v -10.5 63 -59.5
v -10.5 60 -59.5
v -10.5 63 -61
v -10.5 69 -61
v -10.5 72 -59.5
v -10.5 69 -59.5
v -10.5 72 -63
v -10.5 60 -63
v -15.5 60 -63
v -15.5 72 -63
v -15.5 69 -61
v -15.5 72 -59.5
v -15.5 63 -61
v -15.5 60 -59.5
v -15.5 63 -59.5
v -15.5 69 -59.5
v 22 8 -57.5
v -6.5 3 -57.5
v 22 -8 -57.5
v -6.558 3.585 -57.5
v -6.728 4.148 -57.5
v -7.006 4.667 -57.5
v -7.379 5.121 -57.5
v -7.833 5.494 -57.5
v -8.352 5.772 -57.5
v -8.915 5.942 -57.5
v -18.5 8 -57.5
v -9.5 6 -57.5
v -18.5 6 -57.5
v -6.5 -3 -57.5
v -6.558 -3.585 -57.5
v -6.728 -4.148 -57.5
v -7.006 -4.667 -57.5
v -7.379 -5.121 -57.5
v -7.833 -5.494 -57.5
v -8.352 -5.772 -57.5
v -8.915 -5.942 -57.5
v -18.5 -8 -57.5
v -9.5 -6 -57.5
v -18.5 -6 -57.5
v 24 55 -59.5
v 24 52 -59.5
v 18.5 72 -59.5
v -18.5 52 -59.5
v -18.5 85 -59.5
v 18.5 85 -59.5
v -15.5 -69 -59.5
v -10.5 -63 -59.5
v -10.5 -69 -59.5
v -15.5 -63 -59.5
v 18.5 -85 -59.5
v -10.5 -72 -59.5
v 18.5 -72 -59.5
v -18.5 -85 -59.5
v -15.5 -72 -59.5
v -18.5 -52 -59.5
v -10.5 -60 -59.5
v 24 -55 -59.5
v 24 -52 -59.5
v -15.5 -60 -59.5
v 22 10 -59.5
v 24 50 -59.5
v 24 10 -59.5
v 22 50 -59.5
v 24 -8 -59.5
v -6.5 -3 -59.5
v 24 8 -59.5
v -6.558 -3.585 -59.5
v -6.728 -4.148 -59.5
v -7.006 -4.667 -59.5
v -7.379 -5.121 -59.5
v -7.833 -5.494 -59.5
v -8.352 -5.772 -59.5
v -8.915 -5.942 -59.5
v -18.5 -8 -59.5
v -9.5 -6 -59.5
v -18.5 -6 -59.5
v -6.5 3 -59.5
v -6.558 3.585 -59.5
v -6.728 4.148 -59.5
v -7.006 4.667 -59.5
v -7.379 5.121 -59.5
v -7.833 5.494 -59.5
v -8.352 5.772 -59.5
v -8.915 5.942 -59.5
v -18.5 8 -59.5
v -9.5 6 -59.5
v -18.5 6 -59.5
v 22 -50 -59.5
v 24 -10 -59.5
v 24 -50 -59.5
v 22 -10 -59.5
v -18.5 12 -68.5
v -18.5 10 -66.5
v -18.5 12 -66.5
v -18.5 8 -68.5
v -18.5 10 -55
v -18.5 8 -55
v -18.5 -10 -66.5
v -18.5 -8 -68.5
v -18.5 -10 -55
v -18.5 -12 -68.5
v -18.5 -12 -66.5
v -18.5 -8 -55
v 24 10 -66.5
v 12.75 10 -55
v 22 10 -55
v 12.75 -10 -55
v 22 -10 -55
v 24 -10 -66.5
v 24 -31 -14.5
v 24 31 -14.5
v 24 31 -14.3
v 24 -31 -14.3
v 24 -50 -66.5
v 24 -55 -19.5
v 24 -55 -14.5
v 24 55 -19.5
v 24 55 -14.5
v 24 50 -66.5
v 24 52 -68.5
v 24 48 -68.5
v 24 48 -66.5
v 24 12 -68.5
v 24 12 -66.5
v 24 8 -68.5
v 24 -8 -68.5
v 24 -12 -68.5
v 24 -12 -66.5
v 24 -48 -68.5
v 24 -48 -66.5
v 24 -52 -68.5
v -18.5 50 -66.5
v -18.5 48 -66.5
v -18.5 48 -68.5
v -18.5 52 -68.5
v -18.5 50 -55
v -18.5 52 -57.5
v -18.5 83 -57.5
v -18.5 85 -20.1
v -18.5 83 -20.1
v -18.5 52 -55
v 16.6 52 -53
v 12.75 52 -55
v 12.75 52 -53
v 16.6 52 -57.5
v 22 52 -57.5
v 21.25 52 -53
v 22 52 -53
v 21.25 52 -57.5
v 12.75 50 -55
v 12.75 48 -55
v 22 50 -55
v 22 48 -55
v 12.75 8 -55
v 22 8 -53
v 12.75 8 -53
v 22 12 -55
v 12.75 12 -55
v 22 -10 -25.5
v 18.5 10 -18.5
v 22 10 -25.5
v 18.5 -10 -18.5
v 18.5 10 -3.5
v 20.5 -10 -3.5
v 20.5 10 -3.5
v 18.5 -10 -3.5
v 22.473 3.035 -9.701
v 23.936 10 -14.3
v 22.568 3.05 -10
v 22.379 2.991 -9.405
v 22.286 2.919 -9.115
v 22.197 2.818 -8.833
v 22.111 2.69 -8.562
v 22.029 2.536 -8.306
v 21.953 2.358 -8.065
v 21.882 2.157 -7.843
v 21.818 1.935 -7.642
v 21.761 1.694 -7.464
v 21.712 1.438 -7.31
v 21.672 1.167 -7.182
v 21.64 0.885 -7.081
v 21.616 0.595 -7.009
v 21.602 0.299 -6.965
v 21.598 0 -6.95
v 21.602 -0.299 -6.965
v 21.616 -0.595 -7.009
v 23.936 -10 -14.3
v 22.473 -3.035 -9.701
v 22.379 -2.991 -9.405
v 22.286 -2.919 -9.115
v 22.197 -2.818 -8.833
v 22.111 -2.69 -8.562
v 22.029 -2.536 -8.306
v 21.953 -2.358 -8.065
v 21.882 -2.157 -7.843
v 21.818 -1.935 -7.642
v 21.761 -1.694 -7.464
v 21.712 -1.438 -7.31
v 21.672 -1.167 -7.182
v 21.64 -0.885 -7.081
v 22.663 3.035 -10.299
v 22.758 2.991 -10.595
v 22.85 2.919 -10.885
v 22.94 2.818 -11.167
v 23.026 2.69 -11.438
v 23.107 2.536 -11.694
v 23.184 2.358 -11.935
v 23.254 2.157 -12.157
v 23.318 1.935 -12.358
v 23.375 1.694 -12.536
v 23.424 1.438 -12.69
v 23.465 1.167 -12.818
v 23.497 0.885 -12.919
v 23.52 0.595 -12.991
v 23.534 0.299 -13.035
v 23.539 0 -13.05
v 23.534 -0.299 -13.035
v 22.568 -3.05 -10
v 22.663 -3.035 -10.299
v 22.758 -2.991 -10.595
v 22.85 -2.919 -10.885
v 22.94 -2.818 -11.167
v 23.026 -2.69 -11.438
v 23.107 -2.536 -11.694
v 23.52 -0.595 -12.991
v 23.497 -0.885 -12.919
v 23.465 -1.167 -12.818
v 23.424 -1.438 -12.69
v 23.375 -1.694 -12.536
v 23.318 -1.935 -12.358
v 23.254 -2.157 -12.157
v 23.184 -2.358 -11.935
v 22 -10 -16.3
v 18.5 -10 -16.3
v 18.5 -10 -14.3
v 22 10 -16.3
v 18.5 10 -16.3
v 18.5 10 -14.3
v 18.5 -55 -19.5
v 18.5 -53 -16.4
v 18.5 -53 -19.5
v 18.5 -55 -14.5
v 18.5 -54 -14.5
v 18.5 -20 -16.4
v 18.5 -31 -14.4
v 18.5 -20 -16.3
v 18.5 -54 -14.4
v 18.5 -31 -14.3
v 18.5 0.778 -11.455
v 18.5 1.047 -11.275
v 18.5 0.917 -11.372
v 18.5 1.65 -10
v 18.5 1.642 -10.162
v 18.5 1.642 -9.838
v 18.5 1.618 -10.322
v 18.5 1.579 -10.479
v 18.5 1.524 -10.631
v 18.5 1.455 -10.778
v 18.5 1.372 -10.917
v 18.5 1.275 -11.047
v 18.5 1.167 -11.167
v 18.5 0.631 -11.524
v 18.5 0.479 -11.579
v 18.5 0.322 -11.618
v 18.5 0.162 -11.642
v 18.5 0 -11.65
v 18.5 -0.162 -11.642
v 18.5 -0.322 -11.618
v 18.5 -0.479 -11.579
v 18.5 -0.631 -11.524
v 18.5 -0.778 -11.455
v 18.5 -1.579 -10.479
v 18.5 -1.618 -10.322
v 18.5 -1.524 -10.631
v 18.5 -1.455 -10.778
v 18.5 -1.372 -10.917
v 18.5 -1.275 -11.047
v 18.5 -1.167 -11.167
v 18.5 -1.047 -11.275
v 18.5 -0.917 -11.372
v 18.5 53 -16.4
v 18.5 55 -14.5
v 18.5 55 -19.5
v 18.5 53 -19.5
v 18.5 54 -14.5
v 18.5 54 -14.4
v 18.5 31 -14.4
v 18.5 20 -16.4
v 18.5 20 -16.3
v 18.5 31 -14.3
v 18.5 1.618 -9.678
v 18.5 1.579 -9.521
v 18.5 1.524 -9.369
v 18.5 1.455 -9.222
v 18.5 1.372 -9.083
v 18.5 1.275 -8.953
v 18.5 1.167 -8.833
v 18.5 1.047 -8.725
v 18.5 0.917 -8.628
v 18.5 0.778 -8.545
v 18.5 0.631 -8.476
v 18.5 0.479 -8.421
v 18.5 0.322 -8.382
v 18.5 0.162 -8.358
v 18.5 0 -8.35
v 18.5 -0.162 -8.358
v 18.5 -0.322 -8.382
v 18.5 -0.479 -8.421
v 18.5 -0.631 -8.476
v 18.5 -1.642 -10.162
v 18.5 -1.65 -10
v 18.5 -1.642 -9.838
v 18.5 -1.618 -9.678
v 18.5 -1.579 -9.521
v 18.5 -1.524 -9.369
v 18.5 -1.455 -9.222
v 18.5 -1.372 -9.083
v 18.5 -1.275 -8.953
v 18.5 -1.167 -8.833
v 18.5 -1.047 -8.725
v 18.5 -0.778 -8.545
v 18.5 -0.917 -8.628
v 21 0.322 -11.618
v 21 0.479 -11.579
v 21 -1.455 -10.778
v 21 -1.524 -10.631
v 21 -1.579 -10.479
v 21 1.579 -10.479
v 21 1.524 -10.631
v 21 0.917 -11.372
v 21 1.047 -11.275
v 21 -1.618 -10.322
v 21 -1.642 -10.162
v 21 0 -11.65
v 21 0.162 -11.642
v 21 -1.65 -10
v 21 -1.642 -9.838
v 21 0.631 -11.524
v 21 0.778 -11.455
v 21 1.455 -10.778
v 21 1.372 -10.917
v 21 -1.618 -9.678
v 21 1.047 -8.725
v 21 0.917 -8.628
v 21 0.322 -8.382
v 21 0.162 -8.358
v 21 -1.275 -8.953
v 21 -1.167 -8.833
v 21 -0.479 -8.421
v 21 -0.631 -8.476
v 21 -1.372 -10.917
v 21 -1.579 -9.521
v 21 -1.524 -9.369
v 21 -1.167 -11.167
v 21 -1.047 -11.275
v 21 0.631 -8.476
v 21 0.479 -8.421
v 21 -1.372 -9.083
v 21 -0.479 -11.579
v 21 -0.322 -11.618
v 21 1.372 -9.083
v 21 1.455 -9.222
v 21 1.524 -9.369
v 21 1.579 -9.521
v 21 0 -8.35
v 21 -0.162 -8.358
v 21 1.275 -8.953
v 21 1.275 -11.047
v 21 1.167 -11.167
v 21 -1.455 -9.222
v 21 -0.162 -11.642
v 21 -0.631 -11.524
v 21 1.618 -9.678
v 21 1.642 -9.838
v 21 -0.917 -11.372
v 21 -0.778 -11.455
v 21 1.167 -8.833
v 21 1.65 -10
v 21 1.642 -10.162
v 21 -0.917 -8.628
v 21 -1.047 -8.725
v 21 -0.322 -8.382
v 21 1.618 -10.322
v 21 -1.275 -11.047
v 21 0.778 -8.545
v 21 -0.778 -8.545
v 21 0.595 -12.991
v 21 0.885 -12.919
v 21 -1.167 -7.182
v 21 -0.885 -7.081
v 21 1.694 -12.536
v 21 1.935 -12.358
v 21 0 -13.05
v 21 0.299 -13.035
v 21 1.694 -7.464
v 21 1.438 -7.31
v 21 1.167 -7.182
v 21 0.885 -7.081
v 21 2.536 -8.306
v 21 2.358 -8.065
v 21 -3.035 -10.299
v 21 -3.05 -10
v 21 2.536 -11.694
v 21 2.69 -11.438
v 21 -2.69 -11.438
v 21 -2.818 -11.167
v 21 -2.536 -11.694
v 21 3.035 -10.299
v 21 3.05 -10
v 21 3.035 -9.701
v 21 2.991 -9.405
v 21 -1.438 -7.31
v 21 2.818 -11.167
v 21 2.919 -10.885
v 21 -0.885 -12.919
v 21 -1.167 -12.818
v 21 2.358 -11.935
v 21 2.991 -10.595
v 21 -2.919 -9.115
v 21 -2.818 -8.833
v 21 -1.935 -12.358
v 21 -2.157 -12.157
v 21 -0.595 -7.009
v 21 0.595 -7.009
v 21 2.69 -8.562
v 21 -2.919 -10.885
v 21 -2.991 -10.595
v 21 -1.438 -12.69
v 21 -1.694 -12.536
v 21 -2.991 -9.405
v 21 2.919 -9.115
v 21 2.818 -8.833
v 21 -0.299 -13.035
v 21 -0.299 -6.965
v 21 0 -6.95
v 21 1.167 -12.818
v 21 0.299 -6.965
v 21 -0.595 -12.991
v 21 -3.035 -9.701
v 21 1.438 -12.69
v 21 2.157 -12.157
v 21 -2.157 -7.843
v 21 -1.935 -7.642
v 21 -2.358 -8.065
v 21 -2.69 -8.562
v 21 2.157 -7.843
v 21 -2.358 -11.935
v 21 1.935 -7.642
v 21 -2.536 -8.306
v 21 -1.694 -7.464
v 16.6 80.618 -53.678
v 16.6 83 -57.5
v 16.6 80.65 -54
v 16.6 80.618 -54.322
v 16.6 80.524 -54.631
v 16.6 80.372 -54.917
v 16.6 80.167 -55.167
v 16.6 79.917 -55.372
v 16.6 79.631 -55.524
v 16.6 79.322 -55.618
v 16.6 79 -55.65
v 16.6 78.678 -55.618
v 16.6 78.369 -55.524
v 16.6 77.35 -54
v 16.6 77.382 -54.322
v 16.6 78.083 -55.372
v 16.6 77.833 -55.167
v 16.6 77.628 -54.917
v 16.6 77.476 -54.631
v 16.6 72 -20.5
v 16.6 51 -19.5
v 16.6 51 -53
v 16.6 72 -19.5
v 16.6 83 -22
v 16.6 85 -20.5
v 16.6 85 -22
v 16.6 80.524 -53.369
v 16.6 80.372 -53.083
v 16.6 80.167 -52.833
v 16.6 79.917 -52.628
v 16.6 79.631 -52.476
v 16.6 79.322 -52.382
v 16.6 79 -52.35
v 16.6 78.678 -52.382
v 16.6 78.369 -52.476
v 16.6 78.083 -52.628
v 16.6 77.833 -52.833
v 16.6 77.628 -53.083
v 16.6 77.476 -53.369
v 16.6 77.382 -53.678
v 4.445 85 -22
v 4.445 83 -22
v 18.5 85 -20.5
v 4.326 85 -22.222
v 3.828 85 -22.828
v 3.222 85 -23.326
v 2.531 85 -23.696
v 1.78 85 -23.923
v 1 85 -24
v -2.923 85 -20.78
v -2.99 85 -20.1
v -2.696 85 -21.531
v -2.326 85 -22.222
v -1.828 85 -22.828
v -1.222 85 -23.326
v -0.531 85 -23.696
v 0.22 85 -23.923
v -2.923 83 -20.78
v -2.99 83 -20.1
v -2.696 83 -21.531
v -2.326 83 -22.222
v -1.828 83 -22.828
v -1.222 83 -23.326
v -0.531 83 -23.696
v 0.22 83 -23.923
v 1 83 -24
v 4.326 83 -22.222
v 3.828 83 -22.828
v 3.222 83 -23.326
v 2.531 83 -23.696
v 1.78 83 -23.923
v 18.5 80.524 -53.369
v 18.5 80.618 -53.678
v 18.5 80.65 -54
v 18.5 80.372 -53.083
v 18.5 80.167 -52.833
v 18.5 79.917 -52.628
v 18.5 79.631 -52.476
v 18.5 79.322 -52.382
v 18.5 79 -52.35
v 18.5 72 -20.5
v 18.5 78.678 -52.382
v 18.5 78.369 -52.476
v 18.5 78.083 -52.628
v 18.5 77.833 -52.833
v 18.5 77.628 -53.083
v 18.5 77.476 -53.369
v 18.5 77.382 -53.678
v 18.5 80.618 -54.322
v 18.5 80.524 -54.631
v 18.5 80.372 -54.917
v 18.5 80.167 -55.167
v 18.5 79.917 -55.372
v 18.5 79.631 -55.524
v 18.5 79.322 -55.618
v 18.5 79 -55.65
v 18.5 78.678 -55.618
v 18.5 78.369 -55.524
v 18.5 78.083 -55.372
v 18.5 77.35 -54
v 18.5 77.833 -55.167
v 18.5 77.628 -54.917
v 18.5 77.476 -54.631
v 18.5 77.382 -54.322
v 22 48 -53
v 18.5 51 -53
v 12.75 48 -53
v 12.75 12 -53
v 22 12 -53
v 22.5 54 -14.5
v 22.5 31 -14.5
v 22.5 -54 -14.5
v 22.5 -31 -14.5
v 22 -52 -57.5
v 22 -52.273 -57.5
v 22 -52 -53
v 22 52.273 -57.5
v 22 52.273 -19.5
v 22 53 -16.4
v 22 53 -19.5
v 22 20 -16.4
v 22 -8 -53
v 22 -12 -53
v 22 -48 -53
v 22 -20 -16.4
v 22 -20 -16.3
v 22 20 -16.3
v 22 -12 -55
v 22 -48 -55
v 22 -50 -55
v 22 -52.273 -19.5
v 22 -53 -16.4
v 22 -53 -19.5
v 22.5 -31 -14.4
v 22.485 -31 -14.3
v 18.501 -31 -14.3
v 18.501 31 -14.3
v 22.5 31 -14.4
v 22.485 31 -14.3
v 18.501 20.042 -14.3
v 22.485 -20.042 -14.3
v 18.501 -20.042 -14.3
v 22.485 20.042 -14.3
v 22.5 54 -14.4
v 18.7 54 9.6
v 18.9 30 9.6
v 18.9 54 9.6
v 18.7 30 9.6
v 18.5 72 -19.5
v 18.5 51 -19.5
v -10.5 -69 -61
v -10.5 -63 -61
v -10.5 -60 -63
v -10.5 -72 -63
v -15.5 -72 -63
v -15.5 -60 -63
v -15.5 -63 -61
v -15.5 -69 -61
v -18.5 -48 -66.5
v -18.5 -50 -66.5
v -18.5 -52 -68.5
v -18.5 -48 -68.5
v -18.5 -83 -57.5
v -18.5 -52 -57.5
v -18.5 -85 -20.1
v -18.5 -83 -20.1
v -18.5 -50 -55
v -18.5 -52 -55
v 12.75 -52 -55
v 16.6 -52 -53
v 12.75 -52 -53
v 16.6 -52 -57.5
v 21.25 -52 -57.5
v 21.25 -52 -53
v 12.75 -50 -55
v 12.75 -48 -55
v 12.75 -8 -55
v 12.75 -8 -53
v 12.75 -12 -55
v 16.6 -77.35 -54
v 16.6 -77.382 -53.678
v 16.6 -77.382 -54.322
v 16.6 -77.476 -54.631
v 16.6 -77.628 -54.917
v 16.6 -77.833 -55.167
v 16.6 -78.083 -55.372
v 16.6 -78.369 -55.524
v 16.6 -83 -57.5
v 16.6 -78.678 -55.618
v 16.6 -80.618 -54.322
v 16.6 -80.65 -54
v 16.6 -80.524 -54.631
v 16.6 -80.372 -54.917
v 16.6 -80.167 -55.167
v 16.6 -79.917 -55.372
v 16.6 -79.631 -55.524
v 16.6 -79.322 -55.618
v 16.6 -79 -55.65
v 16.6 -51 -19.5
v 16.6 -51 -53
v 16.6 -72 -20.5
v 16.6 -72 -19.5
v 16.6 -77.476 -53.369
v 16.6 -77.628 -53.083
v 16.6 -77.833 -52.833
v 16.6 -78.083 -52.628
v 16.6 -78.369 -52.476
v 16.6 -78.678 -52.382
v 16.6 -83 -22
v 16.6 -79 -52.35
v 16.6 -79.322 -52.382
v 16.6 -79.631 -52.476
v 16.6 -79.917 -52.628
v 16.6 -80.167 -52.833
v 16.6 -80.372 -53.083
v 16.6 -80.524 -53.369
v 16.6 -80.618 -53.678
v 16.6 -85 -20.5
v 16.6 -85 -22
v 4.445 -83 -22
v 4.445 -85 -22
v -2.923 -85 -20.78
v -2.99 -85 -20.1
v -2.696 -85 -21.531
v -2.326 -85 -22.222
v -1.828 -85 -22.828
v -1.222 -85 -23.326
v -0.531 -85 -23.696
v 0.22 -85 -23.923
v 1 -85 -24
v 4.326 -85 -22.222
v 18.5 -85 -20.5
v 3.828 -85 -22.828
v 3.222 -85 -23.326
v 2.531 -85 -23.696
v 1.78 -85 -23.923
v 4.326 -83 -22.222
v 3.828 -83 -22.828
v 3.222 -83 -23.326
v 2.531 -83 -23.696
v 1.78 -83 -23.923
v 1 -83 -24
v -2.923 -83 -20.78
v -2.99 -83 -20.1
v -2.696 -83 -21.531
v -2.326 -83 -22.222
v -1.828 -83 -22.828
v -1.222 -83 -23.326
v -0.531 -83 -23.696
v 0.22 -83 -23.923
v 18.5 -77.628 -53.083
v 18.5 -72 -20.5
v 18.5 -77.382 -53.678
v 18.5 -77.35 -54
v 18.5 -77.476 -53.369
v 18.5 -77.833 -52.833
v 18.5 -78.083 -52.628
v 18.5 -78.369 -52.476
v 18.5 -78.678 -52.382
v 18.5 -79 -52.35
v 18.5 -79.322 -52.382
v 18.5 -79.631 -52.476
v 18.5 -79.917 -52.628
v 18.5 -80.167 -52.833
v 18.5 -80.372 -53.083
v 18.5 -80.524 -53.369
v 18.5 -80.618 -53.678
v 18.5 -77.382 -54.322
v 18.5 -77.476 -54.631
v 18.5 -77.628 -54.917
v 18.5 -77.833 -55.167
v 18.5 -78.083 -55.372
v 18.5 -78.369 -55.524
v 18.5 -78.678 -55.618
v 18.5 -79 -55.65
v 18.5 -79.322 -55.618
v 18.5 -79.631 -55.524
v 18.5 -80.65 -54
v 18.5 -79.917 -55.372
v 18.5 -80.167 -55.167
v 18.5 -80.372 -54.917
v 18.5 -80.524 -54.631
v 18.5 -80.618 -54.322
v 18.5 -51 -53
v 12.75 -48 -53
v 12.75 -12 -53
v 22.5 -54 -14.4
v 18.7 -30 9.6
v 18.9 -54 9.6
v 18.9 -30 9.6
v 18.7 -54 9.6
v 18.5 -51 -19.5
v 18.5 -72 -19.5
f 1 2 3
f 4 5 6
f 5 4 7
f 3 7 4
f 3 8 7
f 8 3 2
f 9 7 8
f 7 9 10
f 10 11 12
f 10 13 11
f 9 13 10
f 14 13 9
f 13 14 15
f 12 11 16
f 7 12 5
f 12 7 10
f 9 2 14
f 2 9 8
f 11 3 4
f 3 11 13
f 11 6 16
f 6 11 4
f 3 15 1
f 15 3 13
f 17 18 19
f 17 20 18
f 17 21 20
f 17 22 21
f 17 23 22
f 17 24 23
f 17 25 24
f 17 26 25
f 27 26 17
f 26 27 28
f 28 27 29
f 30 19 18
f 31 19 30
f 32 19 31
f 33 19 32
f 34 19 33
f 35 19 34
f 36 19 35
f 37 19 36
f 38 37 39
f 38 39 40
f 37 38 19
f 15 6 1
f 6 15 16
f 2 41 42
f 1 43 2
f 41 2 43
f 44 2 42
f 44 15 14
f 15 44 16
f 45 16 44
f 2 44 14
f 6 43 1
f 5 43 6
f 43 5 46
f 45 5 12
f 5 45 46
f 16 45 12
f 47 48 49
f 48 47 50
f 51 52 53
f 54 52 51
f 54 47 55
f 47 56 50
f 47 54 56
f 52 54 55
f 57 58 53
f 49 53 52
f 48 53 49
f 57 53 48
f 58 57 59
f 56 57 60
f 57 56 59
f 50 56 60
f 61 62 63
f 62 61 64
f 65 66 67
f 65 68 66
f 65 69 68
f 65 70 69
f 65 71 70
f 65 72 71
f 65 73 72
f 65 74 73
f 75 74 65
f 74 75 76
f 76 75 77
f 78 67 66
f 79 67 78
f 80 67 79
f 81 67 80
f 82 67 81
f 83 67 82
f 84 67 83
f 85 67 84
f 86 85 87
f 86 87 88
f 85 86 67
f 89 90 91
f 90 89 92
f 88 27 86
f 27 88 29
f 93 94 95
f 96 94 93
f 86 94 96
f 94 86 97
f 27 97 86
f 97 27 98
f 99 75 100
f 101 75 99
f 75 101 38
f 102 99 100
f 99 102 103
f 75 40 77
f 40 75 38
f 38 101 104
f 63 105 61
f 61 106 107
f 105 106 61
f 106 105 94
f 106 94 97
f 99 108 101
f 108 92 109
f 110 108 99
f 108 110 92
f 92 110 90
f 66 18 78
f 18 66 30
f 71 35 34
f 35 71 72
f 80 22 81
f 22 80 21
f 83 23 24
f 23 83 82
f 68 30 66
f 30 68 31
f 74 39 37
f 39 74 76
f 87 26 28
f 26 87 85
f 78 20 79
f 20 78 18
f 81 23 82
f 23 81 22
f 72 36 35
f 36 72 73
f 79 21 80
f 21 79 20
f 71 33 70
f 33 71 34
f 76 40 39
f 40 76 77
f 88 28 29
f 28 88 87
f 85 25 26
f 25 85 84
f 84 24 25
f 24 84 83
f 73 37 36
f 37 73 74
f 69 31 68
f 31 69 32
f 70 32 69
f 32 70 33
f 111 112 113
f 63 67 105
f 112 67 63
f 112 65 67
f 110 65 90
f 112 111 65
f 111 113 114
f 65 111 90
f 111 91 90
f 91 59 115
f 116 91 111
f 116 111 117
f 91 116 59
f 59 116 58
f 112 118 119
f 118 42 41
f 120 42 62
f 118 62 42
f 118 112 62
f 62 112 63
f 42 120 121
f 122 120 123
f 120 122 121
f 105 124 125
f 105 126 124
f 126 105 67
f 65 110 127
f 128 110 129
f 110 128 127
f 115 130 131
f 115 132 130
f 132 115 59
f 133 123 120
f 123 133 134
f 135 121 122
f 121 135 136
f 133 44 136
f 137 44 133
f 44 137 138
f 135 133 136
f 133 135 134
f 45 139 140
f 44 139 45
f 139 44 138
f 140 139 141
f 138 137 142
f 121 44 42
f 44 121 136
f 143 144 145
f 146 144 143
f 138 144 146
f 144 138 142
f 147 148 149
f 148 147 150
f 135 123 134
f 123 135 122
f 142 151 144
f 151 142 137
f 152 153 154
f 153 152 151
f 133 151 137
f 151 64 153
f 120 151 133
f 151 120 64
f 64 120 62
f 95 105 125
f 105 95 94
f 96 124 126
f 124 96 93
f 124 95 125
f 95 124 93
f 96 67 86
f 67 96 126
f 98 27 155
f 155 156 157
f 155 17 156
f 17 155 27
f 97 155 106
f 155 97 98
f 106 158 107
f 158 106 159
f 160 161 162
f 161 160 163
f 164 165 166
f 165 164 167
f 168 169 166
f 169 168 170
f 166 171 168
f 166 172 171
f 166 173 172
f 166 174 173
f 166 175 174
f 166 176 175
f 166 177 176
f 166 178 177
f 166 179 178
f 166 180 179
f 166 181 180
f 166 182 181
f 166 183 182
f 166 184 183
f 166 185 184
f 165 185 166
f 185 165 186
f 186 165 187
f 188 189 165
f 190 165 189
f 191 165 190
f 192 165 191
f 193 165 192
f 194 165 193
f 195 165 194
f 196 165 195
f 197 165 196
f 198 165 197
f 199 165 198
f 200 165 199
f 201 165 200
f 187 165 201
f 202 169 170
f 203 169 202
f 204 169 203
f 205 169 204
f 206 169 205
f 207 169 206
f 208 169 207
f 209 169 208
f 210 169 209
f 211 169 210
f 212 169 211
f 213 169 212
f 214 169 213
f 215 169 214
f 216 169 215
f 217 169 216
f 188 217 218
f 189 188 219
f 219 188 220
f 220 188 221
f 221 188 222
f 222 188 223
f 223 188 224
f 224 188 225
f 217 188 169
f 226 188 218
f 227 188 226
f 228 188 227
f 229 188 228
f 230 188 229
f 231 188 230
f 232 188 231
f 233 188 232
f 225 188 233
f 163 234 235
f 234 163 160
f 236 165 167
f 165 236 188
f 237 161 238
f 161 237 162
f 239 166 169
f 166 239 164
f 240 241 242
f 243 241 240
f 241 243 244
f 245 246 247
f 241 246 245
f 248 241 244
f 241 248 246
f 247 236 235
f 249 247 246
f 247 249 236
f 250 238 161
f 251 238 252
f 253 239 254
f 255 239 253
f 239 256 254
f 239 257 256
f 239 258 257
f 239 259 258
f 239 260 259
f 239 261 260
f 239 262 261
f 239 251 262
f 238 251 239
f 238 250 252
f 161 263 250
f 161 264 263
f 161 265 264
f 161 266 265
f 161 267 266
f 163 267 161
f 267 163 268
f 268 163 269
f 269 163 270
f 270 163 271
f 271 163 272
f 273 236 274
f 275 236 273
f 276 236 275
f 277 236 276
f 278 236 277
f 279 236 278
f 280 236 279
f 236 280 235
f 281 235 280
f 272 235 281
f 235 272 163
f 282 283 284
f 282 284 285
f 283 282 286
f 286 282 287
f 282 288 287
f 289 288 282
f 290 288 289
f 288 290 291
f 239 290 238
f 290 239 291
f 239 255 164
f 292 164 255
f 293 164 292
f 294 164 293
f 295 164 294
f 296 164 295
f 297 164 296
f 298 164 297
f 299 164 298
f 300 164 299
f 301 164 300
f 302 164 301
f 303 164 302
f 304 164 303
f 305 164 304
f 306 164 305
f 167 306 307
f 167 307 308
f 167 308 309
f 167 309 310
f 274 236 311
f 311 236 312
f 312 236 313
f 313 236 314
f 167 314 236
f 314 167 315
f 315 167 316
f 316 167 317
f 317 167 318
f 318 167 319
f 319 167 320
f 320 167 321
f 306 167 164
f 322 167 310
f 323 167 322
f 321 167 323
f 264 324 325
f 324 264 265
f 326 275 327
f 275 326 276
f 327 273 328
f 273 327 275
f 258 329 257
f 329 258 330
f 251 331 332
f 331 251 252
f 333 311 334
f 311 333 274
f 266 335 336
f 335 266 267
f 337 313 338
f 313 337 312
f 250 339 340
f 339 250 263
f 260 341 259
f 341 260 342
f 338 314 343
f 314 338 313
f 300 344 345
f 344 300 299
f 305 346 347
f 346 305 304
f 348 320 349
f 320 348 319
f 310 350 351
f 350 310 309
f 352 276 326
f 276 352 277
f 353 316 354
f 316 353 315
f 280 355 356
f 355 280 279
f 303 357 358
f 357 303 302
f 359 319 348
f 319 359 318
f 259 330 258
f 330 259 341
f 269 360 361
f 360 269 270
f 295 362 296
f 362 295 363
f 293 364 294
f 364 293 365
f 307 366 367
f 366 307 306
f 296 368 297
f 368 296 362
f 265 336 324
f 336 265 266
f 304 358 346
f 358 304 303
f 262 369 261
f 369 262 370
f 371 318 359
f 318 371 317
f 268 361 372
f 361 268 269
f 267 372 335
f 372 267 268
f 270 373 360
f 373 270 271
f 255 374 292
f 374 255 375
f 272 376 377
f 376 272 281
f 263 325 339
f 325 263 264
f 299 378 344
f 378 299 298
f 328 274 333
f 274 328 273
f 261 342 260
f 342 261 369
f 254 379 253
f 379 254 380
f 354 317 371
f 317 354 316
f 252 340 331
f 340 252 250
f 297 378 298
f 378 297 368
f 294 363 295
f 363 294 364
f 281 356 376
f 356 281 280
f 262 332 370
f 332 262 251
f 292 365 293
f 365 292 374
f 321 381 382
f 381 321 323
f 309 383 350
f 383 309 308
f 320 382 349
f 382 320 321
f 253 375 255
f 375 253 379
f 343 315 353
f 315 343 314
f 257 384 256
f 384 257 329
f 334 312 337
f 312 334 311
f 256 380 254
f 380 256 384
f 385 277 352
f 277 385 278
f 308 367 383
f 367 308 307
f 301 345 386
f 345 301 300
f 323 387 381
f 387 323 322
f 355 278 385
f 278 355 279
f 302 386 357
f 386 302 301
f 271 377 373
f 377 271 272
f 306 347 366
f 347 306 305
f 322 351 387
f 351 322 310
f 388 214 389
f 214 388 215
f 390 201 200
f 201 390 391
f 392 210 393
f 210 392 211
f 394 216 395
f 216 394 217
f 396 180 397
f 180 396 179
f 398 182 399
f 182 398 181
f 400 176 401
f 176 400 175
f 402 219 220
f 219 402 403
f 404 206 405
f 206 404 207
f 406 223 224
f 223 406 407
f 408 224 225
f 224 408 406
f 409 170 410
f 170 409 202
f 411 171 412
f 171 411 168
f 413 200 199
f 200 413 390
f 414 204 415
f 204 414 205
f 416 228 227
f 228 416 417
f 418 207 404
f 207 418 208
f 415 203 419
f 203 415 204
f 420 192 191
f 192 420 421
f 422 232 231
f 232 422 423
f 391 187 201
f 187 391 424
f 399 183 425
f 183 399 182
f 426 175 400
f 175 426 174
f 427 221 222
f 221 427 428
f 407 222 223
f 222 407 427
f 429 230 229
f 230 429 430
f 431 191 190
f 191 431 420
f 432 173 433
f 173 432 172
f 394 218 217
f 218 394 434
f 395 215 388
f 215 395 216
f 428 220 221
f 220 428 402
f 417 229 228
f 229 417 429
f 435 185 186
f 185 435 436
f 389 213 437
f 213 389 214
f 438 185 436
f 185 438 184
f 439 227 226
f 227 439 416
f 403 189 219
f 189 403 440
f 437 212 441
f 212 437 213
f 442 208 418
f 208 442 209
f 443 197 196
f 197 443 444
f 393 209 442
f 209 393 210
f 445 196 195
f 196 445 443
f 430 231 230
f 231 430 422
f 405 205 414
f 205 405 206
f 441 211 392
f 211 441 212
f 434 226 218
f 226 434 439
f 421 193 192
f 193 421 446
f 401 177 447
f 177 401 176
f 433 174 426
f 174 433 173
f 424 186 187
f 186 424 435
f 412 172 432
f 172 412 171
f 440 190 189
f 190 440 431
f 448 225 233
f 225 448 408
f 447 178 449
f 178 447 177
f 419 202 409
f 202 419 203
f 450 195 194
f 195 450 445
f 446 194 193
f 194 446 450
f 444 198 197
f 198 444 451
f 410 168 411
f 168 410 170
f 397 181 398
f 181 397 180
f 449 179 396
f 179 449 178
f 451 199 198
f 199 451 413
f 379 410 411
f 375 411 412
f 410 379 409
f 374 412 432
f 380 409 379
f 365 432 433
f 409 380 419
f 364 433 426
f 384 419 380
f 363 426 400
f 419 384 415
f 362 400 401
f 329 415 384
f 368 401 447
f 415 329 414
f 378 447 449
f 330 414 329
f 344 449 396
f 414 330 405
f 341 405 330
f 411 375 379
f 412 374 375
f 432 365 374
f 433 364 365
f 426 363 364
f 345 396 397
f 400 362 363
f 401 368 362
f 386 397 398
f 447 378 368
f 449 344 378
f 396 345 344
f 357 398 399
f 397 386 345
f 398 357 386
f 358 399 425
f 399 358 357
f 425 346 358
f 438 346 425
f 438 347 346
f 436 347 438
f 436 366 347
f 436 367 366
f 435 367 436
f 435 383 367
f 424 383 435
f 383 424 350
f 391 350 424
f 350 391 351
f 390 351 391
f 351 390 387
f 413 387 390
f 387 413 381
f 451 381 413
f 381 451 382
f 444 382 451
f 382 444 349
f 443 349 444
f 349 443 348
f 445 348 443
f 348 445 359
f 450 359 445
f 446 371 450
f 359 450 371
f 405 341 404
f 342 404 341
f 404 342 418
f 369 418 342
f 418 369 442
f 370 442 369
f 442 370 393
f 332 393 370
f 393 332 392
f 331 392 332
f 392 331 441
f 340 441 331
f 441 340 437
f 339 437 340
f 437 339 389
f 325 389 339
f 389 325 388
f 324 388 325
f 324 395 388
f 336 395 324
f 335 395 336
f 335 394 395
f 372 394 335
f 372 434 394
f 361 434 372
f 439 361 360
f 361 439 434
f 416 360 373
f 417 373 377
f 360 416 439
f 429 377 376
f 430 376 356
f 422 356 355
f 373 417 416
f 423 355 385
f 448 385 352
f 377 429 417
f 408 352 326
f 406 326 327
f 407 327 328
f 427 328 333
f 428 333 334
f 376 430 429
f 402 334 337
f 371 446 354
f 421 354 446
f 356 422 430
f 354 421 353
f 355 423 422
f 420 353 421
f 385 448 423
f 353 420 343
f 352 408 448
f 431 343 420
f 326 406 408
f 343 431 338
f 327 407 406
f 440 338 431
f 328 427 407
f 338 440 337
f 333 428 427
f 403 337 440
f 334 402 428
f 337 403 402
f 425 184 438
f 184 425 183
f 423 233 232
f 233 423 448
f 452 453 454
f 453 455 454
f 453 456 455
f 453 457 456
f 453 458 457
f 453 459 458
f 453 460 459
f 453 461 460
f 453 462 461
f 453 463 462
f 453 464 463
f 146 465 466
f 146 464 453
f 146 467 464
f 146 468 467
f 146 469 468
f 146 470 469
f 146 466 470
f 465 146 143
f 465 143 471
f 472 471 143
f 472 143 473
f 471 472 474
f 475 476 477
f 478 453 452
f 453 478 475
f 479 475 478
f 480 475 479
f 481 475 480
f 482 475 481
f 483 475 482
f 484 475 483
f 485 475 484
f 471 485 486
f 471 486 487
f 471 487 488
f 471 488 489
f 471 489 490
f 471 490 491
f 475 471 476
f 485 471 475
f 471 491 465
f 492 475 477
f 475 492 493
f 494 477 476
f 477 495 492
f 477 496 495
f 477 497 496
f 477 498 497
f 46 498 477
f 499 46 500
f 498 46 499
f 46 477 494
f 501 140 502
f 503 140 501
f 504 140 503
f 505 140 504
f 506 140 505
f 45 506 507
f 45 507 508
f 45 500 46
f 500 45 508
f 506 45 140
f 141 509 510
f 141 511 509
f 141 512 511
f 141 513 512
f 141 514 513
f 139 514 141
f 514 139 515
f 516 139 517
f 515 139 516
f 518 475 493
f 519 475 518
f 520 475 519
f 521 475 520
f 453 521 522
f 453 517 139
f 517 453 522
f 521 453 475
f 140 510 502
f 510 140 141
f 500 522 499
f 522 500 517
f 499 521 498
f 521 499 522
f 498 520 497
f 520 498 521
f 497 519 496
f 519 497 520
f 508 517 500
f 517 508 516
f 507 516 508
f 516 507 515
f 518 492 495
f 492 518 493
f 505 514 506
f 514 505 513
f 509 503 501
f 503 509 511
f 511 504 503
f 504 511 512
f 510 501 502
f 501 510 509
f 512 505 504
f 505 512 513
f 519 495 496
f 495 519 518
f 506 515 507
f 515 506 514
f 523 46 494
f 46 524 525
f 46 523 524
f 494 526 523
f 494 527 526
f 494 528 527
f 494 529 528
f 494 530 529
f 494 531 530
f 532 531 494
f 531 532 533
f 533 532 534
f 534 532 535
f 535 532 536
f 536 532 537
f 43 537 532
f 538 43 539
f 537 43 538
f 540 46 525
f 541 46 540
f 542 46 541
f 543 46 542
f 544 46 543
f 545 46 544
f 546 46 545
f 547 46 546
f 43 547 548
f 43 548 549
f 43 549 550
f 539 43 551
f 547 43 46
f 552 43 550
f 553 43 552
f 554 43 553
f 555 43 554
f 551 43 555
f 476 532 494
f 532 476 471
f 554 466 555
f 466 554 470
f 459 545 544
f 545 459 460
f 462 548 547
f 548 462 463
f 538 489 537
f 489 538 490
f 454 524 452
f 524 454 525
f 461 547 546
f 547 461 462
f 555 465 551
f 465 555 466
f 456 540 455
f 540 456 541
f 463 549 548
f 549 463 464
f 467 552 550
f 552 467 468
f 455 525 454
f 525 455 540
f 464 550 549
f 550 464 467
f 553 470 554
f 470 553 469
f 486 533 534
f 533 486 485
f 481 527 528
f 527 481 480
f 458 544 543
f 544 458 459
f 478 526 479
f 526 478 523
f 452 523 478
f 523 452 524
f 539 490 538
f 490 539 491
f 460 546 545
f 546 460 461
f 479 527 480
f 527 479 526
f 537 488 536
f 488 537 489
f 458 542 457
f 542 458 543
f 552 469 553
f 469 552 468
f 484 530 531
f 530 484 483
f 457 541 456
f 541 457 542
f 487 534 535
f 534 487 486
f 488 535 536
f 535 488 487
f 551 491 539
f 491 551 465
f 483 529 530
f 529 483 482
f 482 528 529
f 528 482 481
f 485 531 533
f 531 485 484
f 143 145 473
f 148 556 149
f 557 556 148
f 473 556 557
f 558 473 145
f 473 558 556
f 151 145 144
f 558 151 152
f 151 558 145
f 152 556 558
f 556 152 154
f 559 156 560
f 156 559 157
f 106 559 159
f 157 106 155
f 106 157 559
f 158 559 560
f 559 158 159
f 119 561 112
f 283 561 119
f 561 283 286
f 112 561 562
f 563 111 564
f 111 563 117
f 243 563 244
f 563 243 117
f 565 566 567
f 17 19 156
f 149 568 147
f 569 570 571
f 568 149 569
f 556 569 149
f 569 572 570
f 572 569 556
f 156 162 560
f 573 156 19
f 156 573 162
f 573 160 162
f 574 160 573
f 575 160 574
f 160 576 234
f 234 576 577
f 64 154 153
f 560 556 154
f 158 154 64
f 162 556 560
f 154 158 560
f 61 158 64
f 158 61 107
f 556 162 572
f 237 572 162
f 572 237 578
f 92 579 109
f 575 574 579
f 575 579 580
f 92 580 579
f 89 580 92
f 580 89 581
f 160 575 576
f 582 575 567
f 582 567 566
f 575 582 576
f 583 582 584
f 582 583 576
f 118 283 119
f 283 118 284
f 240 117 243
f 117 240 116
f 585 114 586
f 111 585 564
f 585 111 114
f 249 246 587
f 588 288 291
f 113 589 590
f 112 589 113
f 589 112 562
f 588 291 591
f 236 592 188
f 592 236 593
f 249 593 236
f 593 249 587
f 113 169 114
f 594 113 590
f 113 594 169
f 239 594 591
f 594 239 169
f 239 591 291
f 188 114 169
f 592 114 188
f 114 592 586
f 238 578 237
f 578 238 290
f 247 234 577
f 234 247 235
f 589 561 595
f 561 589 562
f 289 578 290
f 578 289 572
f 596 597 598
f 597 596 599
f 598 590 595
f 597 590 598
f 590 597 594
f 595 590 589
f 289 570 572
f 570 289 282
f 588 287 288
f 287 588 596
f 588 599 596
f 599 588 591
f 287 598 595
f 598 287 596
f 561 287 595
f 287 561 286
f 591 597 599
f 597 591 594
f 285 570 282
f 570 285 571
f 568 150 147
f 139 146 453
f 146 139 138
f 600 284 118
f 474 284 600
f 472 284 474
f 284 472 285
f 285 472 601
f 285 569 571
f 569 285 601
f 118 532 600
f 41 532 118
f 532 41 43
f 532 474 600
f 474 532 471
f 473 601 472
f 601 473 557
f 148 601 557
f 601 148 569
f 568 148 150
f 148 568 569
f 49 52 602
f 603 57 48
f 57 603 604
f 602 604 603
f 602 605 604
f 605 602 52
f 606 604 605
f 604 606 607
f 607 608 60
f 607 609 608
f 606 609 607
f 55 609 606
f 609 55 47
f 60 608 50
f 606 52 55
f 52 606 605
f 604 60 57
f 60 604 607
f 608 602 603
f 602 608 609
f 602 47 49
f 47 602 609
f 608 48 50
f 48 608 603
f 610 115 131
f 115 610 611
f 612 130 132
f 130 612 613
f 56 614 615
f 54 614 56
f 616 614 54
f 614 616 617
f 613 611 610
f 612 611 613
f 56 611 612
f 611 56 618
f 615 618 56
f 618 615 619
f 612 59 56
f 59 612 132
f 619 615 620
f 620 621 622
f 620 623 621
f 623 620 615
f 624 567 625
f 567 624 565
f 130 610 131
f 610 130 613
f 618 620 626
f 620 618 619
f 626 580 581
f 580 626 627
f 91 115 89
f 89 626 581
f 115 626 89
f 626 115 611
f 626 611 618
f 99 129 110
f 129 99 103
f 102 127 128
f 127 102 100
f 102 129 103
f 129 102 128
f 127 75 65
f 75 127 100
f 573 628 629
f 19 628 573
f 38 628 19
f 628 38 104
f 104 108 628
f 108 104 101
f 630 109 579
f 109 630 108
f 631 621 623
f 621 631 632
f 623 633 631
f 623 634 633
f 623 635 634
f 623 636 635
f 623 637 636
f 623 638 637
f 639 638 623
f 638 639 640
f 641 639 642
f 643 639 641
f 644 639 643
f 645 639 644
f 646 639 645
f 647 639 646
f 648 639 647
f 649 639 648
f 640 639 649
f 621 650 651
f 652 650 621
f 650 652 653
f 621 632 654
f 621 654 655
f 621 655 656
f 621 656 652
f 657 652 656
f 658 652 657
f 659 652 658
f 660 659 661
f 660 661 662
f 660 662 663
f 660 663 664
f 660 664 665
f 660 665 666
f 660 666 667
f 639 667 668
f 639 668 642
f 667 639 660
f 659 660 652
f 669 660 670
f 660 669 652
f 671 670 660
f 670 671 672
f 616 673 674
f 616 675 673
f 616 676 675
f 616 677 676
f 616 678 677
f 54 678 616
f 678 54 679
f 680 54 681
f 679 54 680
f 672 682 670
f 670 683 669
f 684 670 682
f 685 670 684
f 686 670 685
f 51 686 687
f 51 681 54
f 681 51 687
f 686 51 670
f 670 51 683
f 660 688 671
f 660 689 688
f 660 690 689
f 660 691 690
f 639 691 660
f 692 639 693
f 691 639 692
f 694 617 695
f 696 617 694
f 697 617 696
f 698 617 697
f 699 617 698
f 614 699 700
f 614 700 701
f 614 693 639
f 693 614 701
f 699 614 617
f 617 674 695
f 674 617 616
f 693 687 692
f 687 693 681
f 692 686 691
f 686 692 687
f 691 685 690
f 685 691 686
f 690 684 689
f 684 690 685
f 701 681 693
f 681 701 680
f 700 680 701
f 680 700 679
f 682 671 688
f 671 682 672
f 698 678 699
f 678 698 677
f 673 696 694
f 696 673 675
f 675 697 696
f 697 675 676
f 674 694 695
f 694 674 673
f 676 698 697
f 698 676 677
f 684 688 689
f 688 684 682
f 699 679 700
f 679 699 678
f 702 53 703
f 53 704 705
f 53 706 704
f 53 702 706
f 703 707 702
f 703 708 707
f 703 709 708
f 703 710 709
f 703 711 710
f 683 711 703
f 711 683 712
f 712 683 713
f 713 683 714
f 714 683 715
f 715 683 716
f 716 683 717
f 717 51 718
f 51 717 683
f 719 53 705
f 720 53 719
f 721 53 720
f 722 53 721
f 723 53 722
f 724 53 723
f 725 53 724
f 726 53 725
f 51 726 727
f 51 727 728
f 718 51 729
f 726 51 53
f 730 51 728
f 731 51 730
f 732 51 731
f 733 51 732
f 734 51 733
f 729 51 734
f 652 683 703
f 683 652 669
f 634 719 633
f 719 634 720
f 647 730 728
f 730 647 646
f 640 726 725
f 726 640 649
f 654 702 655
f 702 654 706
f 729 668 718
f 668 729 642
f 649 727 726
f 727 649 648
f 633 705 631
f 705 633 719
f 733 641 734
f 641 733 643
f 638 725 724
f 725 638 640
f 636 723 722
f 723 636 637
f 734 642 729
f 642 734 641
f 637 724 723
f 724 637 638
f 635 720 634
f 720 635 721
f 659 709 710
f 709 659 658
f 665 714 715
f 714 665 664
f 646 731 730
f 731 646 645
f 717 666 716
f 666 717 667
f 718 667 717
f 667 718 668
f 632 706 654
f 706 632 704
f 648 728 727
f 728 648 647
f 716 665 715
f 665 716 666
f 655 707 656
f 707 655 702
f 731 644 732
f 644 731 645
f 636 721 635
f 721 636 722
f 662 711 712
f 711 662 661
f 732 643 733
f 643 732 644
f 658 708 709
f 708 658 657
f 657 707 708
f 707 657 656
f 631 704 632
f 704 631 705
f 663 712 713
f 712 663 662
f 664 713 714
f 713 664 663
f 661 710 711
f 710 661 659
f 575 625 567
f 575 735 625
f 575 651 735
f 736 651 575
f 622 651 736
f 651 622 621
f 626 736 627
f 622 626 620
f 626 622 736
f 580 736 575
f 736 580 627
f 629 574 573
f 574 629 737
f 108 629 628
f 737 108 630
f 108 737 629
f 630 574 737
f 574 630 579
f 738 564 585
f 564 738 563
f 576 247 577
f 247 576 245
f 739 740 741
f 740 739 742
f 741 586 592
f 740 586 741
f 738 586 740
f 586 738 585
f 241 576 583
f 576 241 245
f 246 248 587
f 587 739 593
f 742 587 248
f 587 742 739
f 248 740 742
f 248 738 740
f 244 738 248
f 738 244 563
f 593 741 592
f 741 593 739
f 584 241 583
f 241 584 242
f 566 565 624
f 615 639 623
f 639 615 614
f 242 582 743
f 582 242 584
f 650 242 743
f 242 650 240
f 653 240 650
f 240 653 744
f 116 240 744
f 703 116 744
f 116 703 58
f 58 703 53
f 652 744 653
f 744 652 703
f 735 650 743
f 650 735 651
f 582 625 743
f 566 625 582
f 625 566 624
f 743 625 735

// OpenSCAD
module back_cover_half() {

//wire clips

difference() {
color("green")
translate([-13,66, -51 -10])
cube([5,12,4],center=true);

color("green")
translate([-13,66, -50 -10])
cube([6,6,2],center=true);
}


// fan anti rideup feature

color("green")
translate([2.75 + 15,50, -44 - 10])
cube([10,4,2],center=true);


color("green")
translate([2.75 + 15,10, -44 -10])
cube([10,4,2],center=true);

//the bits holding the fans on
union() {
color("green")
translate([2.75,50, -56 -11.5])
cube([42.5,4,2],center=true);


color("green")
translate([2.75,51, -50 -11])
cube([42.5,2,12],center=true);


color("green")
translate([2.75,10, -56 -11.5])
cube([42.5,4,2],center=true);

color("green")
translate([2.75,9, -50 -11])
cube([42.5,2,12],center=true);

//between two fans
color("green")
difference() {
translate([2,0, -48.5 -10])
cube([41,20,2],center=true);




translate([-18.5,0, -48.5 -10])
hull() {


translate([-8,-3,0])
cylinder(r=3,h=10,$fn=32,center=true);
translate([9,-3,0])
cylinder(r=3,h=10,$fn=32,center=true);

translate([-8,3,0])
cylinder(r=3,h=10,$fn=32,center=true);
translate([9,3,0])
cylinder(r=3,h=10,$fn=32,center=true);
}

}
}

//the back cover (lower)

color("green")
    translate([23,0, -19.5 - 12.5 -5])
cube([2,110,45],center=true);


translate([2,0,0])
color("green")
difference() {
color("red")


// the upper screw tab
hull() {
translate([17.5,0, -11])
cube([2,20,15],center=true);

translate([21,0, -20])
cube([2,20,11],center=true);
}

translate([0,0, -10])
rotate([0,90,0])
cylinder(d=3.3,h=60,$fn=64,center=true);

translate([49,0, -10])
rotate([0,90,0])
cylinder(d=6.1,h=60,$fn=64,center=true);
}


// the side of the cuttout
/*
translate([0,-41.1,0])

color("green")
hull() {
color("brown")
translate([17.5,10, 1.1 - 5])
cube([2,2,26],center=true);


color("brown")
translate([23,10, 1.75 - 5])
cube([2,2,27.5],center=true);
}
*/
//the bottom of the cutout
color("green")
hull() {
color("red")
translate([19.5,0, -15.3])
cube([2,62,2],center=true);

color("red")
translate([23,0, -15.3])
cube([2,62,2],center=true);
}

// the top of the side wings
/*
color("green")
difference() {
color("green")
translate([20.6,0, 9.5])
cube([4,110,2],center=true);
color("red")
translate([23,0, 5])
cube([40,60.4,20],center=true);
}
*/
hull() {
color("green")
translate([20.5 - 1.7,42, 9.5])
cube([0.2,24,0.2],center=true);

color("green")
translate([20.5,37, 9.5 - 24.9])
cube([4,34,2],center=true);
}

//the edge of the backmost piece
color("green")
translate([20.6,54, -32])
cube([4.2,2,35],center=true);


color("green")
translate([20.6 - 17.6 - 2 - 2 + 0.05,52.5 + 15, -20 - 30 + 1.5 -10])
cube([35.1,35,2],center=true);


color("green")
translate([20.6 - 17.6 - 2 +20 - 0.5 - 1,52.5 -0.5, -20 - 30 + 1.5 - 10])
cube([8,4,2],center=true);


color("green")
// the side of the cover
difference() {
union() {
color("green")
translate([20.6 - 17.6 - 2 - 2 + 0.05,52.5 + 15 + 16.5, -20 - 30 + 1.5 + 13.5 - 5])
cube([35.1,2,36],center=true);

translate([20.6 - 17.6 - 2 - 2 - 6 -0.05,52.5 + 15 + 16.5 , -20 - 30 + 1.5 + 13.5 + 0.4])
cube([22.9,2,29],center=true);
}
translate([2 + 20.6 - 17.6 - 2 - 2,52.5 + 15 + 16.5, -20 - 30 + 1.5 + 13.5 + 15])
rotate([90,0,0])
cylinder(d=8,h=30,$fn=32,center=true);
}

// the marker for the through hole
//translate([20.6 - 17.6 - 2 - 2 ,52.5 + 15 + 16.5-5, -20 - 30 + 1.5 + 13.5 -11])
//rotate([0,90,0])
//cylinder(d=6,h=40,$fn=32,center=true);


//the bit with the hole in it (lower) (next to the bit that interfaces with the fan cowling)
difference() {
color("green")
translate([20.6 - 17.6 - 2 + 16.5 + 0.05,52.5 + 15 + 1.5, -20 - 30 + 1.5 + 13.5 - 5])
cube([1.9,32,39],center=true);
translate([20.6 - 17.6 - 2 - 2 ,52.5 + 15 + 16.5-5, -20 - 30 + 1.5 + 13.5 -9 - 10])
rotate([0,90,0])
cylinder(d=3.3,h=40,$fn=32,center=true);
}


// the little raised bit that interfaces with the fan cowling cutout

translate([0,0,-5])
hull(){
color("green")
translate([20.6 - 17.6 - 2 + 16.5 + 0.05,52.5 + 9 , -20 - 30 + 1.5 + 13.5 + 0.5])
cube([1.9,21,40],center=true);


color("green")
translate([20.6 - 17.6 - 2 + 16.5 + 0.05 +5.5,52.5 - 10 + 1 + 10.5, -20 - 30 + 1.5 + 13.5 + 0.5])
cube([1.9,2,40],center=true);
}
}


color([0.0,1,0.1,0.5])

back_cover_half();

color([0.0,1,0.1,0.5])
scale([1,-1,1])
back_cover_half();
